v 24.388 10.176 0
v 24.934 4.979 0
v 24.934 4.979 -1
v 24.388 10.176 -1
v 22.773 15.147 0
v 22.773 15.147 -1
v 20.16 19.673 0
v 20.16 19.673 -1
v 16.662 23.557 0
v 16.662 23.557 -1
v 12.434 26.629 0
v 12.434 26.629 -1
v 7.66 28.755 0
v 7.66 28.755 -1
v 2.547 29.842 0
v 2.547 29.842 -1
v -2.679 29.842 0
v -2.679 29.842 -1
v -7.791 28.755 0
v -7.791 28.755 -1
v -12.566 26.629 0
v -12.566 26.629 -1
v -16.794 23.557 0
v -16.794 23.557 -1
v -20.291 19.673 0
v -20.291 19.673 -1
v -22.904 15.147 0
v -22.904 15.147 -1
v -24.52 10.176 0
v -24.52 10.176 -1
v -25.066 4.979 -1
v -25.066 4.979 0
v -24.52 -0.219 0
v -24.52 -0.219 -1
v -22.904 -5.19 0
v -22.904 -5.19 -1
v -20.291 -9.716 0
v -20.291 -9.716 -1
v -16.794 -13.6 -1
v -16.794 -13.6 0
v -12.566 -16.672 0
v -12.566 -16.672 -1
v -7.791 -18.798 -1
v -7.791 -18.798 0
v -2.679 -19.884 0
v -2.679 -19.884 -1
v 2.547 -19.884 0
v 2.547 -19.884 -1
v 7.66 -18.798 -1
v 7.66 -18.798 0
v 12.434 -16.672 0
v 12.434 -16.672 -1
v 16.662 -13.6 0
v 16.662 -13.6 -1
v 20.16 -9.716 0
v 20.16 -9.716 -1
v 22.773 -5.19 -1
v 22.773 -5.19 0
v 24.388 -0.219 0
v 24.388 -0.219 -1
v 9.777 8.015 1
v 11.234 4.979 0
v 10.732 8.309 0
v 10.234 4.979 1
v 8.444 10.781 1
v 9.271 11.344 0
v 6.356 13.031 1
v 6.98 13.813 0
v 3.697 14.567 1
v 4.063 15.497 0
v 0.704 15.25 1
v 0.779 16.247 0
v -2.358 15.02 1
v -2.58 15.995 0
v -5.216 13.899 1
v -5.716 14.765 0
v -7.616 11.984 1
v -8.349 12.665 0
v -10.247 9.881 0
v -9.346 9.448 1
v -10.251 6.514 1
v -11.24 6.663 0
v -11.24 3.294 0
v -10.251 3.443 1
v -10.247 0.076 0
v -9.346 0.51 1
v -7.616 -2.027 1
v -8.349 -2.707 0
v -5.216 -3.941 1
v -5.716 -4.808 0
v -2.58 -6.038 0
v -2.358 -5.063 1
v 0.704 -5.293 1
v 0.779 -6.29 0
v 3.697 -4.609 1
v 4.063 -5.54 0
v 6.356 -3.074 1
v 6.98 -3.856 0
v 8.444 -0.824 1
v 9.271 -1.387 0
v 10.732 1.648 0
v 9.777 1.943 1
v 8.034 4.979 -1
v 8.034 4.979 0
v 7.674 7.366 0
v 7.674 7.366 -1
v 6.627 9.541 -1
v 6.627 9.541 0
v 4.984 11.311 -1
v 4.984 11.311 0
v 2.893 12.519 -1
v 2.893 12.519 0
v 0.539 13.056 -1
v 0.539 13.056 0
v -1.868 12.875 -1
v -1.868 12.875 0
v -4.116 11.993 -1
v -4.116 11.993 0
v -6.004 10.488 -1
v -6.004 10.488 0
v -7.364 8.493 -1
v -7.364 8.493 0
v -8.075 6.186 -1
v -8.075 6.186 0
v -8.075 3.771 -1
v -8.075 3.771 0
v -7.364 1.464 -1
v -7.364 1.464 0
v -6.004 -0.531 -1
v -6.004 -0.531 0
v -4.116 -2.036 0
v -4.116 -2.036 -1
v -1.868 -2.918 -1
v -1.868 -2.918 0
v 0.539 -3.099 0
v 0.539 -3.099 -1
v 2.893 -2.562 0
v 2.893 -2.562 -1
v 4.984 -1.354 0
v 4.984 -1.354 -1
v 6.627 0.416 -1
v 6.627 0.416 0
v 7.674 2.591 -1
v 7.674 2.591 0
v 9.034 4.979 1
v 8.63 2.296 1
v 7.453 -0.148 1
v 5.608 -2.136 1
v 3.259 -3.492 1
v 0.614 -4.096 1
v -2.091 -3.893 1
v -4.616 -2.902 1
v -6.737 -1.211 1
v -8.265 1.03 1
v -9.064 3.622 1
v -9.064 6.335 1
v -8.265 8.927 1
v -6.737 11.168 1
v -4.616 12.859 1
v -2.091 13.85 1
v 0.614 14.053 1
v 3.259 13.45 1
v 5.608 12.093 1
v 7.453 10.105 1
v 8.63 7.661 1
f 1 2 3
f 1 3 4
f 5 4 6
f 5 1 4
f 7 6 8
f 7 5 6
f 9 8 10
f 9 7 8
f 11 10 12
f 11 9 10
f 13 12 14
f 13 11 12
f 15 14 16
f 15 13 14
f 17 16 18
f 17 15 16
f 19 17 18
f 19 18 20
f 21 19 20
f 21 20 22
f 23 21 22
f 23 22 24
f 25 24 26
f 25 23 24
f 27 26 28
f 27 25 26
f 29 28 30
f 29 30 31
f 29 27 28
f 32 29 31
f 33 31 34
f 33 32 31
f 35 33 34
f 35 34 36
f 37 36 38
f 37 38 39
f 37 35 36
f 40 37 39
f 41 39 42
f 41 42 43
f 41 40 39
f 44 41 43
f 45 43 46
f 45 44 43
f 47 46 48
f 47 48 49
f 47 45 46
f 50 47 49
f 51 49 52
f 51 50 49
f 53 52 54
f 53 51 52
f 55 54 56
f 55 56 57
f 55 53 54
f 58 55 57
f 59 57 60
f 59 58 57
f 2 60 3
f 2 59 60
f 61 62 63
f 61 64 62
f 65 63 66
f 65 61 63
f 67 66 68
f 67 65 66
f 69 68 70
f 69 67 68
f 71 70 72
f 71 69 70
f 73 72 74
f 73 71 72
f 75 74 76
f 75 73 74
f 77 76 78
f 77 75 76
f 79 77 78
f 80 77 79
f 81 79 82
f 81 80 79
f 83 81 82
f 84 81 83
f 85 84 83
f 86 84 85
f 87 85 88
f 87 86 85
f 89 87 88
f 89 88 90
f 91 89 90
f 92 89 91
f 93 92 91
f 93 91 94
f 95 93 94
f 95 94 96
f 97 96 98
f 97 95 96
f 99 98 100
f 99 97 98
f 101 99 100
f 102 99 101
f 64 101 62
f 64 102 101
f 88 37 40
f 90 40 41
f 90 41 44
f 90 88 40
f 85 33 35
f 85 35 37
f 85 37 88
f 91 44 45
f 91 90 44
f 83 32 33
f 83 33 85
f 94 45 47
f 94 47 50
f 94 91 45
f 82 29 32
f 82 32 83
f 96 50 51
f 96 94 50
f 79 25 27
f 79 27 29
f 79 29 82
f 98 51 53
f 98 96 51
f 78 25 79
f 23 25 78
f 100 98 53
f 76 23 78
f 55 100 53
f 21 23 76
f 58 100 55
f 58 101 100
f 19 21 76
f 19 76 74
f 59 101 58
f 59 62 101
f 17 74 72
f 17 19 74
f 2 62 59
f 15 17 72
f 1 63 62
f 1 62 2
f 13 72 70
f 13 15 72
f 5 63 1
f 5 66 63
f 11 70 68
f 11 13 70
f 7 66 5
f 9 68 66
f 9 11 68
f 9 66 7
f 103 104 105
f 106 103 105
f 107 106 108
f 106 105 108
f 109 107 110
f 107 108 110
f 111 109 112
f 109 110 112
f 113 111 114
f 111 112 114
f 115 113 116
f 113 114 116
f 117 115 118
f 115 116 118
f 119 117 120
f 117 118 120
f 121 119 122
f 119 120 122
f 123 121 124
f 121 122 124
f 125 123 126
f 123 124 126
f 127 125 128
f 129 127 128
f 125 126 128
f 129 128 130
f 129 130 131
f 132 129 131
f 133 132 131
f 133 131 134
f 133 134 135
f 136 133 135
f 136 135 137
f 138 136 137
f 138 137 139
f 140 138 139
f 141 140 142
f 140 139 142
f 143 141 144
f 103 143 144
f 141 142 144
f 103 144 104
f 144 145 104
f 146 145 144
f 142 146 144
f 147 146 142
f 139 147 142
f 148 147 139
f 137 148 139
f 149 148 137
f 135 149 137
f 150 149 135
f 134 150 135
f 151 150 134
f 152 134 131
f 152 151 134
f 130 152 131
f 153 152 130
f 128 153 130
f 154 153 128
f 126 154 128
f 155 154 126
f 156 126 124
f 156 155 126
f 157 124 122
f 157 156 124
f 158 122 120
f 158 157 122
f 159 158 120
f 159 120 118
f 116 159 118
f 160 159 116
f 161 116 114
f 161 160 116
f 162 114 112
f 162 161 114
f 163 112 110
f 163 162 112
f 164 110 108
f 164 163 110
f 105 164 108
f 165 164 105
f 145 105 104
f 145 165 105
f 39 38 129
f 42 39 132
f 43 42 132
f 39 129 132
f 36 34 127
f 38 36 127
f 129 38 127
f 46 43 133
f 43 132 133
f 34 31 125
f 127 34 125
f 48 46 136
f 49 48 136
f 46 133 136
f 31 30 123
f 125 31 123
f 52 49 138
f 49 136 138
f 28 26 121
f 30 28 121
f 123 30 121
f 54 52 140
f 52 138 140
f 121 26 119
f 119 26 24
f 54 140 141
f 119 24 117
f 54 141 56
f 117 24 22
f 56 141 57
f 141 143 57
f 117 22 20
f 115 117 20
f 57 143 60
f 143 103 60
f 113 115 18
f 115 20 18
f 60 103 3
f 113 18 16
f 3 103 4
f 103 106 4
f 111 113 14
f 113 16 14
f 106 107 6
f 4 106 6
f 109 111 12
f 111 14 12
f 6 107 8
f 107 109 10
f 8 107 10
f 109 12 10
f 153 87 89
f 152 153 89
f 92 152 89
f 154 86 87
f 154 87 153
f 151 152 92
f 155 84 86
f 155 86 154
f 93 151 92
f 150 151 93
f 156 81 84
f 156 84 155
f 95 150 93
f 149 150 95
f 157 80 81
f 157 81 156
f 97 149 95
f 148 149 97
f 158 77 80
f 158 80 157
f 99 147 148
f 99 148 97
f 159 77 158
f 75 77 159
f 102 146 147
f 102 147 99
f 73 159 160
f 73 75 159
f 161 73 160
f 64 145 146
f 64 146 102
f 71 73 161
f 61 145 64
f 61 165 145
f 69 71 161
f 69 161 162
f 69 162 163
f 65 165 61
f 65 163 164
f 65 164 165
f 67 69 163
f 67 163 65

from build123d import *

# Parameters (mm, degrees)
SZKIC1_R                    = 25
SZKIC1_R_2                  = 8.1
DODANIE_WYCI_GNI_CIE1_DEPTH = 1
SZKIC2_R                    = 11.3
SZKIC2_R_2                  = 8.1
DODANIE_WYCI_GNI_CIE2_DEPTH = 1
DODANIE_WYCI_GNI_CIE2_TAPER = 45


with BuildPart() as part:
    # Szkic1 → Dodanie-wyciągnięcie1 (new body)
    with BuildSketch(Plane.XY):
        with Locations((-0.065846009, 4.978571429)):
            Circle(SZKIC1_R)
        with Locations((-0.065846009, 4.978571429)):
            Circle(SZKIC1_R_2, mode=Mode.SUBTRACT)
    extrude(amount=-DODANIE_WYCI_GNI_CIE1_DEPTH)

    # Szkic2 → Dodanie-wyciągnięcie2 (add)
    with BuildSketch(Plane.XY):
        with Locations((-0.065846009, 4.978571429)):
            Circle(SZKIC2_R)
        with Locations((-0.065846009, 4.978571429)):
            Circle(SZKIC2_R_2, mode=Mode.SUBTRACT)
    extrude(amount=DODANIE_WYCI_GNI_CIE2_DEPTH, taper=DODANIE_WYCI_GNI_CIE2_TAPER)


solid = part.part
